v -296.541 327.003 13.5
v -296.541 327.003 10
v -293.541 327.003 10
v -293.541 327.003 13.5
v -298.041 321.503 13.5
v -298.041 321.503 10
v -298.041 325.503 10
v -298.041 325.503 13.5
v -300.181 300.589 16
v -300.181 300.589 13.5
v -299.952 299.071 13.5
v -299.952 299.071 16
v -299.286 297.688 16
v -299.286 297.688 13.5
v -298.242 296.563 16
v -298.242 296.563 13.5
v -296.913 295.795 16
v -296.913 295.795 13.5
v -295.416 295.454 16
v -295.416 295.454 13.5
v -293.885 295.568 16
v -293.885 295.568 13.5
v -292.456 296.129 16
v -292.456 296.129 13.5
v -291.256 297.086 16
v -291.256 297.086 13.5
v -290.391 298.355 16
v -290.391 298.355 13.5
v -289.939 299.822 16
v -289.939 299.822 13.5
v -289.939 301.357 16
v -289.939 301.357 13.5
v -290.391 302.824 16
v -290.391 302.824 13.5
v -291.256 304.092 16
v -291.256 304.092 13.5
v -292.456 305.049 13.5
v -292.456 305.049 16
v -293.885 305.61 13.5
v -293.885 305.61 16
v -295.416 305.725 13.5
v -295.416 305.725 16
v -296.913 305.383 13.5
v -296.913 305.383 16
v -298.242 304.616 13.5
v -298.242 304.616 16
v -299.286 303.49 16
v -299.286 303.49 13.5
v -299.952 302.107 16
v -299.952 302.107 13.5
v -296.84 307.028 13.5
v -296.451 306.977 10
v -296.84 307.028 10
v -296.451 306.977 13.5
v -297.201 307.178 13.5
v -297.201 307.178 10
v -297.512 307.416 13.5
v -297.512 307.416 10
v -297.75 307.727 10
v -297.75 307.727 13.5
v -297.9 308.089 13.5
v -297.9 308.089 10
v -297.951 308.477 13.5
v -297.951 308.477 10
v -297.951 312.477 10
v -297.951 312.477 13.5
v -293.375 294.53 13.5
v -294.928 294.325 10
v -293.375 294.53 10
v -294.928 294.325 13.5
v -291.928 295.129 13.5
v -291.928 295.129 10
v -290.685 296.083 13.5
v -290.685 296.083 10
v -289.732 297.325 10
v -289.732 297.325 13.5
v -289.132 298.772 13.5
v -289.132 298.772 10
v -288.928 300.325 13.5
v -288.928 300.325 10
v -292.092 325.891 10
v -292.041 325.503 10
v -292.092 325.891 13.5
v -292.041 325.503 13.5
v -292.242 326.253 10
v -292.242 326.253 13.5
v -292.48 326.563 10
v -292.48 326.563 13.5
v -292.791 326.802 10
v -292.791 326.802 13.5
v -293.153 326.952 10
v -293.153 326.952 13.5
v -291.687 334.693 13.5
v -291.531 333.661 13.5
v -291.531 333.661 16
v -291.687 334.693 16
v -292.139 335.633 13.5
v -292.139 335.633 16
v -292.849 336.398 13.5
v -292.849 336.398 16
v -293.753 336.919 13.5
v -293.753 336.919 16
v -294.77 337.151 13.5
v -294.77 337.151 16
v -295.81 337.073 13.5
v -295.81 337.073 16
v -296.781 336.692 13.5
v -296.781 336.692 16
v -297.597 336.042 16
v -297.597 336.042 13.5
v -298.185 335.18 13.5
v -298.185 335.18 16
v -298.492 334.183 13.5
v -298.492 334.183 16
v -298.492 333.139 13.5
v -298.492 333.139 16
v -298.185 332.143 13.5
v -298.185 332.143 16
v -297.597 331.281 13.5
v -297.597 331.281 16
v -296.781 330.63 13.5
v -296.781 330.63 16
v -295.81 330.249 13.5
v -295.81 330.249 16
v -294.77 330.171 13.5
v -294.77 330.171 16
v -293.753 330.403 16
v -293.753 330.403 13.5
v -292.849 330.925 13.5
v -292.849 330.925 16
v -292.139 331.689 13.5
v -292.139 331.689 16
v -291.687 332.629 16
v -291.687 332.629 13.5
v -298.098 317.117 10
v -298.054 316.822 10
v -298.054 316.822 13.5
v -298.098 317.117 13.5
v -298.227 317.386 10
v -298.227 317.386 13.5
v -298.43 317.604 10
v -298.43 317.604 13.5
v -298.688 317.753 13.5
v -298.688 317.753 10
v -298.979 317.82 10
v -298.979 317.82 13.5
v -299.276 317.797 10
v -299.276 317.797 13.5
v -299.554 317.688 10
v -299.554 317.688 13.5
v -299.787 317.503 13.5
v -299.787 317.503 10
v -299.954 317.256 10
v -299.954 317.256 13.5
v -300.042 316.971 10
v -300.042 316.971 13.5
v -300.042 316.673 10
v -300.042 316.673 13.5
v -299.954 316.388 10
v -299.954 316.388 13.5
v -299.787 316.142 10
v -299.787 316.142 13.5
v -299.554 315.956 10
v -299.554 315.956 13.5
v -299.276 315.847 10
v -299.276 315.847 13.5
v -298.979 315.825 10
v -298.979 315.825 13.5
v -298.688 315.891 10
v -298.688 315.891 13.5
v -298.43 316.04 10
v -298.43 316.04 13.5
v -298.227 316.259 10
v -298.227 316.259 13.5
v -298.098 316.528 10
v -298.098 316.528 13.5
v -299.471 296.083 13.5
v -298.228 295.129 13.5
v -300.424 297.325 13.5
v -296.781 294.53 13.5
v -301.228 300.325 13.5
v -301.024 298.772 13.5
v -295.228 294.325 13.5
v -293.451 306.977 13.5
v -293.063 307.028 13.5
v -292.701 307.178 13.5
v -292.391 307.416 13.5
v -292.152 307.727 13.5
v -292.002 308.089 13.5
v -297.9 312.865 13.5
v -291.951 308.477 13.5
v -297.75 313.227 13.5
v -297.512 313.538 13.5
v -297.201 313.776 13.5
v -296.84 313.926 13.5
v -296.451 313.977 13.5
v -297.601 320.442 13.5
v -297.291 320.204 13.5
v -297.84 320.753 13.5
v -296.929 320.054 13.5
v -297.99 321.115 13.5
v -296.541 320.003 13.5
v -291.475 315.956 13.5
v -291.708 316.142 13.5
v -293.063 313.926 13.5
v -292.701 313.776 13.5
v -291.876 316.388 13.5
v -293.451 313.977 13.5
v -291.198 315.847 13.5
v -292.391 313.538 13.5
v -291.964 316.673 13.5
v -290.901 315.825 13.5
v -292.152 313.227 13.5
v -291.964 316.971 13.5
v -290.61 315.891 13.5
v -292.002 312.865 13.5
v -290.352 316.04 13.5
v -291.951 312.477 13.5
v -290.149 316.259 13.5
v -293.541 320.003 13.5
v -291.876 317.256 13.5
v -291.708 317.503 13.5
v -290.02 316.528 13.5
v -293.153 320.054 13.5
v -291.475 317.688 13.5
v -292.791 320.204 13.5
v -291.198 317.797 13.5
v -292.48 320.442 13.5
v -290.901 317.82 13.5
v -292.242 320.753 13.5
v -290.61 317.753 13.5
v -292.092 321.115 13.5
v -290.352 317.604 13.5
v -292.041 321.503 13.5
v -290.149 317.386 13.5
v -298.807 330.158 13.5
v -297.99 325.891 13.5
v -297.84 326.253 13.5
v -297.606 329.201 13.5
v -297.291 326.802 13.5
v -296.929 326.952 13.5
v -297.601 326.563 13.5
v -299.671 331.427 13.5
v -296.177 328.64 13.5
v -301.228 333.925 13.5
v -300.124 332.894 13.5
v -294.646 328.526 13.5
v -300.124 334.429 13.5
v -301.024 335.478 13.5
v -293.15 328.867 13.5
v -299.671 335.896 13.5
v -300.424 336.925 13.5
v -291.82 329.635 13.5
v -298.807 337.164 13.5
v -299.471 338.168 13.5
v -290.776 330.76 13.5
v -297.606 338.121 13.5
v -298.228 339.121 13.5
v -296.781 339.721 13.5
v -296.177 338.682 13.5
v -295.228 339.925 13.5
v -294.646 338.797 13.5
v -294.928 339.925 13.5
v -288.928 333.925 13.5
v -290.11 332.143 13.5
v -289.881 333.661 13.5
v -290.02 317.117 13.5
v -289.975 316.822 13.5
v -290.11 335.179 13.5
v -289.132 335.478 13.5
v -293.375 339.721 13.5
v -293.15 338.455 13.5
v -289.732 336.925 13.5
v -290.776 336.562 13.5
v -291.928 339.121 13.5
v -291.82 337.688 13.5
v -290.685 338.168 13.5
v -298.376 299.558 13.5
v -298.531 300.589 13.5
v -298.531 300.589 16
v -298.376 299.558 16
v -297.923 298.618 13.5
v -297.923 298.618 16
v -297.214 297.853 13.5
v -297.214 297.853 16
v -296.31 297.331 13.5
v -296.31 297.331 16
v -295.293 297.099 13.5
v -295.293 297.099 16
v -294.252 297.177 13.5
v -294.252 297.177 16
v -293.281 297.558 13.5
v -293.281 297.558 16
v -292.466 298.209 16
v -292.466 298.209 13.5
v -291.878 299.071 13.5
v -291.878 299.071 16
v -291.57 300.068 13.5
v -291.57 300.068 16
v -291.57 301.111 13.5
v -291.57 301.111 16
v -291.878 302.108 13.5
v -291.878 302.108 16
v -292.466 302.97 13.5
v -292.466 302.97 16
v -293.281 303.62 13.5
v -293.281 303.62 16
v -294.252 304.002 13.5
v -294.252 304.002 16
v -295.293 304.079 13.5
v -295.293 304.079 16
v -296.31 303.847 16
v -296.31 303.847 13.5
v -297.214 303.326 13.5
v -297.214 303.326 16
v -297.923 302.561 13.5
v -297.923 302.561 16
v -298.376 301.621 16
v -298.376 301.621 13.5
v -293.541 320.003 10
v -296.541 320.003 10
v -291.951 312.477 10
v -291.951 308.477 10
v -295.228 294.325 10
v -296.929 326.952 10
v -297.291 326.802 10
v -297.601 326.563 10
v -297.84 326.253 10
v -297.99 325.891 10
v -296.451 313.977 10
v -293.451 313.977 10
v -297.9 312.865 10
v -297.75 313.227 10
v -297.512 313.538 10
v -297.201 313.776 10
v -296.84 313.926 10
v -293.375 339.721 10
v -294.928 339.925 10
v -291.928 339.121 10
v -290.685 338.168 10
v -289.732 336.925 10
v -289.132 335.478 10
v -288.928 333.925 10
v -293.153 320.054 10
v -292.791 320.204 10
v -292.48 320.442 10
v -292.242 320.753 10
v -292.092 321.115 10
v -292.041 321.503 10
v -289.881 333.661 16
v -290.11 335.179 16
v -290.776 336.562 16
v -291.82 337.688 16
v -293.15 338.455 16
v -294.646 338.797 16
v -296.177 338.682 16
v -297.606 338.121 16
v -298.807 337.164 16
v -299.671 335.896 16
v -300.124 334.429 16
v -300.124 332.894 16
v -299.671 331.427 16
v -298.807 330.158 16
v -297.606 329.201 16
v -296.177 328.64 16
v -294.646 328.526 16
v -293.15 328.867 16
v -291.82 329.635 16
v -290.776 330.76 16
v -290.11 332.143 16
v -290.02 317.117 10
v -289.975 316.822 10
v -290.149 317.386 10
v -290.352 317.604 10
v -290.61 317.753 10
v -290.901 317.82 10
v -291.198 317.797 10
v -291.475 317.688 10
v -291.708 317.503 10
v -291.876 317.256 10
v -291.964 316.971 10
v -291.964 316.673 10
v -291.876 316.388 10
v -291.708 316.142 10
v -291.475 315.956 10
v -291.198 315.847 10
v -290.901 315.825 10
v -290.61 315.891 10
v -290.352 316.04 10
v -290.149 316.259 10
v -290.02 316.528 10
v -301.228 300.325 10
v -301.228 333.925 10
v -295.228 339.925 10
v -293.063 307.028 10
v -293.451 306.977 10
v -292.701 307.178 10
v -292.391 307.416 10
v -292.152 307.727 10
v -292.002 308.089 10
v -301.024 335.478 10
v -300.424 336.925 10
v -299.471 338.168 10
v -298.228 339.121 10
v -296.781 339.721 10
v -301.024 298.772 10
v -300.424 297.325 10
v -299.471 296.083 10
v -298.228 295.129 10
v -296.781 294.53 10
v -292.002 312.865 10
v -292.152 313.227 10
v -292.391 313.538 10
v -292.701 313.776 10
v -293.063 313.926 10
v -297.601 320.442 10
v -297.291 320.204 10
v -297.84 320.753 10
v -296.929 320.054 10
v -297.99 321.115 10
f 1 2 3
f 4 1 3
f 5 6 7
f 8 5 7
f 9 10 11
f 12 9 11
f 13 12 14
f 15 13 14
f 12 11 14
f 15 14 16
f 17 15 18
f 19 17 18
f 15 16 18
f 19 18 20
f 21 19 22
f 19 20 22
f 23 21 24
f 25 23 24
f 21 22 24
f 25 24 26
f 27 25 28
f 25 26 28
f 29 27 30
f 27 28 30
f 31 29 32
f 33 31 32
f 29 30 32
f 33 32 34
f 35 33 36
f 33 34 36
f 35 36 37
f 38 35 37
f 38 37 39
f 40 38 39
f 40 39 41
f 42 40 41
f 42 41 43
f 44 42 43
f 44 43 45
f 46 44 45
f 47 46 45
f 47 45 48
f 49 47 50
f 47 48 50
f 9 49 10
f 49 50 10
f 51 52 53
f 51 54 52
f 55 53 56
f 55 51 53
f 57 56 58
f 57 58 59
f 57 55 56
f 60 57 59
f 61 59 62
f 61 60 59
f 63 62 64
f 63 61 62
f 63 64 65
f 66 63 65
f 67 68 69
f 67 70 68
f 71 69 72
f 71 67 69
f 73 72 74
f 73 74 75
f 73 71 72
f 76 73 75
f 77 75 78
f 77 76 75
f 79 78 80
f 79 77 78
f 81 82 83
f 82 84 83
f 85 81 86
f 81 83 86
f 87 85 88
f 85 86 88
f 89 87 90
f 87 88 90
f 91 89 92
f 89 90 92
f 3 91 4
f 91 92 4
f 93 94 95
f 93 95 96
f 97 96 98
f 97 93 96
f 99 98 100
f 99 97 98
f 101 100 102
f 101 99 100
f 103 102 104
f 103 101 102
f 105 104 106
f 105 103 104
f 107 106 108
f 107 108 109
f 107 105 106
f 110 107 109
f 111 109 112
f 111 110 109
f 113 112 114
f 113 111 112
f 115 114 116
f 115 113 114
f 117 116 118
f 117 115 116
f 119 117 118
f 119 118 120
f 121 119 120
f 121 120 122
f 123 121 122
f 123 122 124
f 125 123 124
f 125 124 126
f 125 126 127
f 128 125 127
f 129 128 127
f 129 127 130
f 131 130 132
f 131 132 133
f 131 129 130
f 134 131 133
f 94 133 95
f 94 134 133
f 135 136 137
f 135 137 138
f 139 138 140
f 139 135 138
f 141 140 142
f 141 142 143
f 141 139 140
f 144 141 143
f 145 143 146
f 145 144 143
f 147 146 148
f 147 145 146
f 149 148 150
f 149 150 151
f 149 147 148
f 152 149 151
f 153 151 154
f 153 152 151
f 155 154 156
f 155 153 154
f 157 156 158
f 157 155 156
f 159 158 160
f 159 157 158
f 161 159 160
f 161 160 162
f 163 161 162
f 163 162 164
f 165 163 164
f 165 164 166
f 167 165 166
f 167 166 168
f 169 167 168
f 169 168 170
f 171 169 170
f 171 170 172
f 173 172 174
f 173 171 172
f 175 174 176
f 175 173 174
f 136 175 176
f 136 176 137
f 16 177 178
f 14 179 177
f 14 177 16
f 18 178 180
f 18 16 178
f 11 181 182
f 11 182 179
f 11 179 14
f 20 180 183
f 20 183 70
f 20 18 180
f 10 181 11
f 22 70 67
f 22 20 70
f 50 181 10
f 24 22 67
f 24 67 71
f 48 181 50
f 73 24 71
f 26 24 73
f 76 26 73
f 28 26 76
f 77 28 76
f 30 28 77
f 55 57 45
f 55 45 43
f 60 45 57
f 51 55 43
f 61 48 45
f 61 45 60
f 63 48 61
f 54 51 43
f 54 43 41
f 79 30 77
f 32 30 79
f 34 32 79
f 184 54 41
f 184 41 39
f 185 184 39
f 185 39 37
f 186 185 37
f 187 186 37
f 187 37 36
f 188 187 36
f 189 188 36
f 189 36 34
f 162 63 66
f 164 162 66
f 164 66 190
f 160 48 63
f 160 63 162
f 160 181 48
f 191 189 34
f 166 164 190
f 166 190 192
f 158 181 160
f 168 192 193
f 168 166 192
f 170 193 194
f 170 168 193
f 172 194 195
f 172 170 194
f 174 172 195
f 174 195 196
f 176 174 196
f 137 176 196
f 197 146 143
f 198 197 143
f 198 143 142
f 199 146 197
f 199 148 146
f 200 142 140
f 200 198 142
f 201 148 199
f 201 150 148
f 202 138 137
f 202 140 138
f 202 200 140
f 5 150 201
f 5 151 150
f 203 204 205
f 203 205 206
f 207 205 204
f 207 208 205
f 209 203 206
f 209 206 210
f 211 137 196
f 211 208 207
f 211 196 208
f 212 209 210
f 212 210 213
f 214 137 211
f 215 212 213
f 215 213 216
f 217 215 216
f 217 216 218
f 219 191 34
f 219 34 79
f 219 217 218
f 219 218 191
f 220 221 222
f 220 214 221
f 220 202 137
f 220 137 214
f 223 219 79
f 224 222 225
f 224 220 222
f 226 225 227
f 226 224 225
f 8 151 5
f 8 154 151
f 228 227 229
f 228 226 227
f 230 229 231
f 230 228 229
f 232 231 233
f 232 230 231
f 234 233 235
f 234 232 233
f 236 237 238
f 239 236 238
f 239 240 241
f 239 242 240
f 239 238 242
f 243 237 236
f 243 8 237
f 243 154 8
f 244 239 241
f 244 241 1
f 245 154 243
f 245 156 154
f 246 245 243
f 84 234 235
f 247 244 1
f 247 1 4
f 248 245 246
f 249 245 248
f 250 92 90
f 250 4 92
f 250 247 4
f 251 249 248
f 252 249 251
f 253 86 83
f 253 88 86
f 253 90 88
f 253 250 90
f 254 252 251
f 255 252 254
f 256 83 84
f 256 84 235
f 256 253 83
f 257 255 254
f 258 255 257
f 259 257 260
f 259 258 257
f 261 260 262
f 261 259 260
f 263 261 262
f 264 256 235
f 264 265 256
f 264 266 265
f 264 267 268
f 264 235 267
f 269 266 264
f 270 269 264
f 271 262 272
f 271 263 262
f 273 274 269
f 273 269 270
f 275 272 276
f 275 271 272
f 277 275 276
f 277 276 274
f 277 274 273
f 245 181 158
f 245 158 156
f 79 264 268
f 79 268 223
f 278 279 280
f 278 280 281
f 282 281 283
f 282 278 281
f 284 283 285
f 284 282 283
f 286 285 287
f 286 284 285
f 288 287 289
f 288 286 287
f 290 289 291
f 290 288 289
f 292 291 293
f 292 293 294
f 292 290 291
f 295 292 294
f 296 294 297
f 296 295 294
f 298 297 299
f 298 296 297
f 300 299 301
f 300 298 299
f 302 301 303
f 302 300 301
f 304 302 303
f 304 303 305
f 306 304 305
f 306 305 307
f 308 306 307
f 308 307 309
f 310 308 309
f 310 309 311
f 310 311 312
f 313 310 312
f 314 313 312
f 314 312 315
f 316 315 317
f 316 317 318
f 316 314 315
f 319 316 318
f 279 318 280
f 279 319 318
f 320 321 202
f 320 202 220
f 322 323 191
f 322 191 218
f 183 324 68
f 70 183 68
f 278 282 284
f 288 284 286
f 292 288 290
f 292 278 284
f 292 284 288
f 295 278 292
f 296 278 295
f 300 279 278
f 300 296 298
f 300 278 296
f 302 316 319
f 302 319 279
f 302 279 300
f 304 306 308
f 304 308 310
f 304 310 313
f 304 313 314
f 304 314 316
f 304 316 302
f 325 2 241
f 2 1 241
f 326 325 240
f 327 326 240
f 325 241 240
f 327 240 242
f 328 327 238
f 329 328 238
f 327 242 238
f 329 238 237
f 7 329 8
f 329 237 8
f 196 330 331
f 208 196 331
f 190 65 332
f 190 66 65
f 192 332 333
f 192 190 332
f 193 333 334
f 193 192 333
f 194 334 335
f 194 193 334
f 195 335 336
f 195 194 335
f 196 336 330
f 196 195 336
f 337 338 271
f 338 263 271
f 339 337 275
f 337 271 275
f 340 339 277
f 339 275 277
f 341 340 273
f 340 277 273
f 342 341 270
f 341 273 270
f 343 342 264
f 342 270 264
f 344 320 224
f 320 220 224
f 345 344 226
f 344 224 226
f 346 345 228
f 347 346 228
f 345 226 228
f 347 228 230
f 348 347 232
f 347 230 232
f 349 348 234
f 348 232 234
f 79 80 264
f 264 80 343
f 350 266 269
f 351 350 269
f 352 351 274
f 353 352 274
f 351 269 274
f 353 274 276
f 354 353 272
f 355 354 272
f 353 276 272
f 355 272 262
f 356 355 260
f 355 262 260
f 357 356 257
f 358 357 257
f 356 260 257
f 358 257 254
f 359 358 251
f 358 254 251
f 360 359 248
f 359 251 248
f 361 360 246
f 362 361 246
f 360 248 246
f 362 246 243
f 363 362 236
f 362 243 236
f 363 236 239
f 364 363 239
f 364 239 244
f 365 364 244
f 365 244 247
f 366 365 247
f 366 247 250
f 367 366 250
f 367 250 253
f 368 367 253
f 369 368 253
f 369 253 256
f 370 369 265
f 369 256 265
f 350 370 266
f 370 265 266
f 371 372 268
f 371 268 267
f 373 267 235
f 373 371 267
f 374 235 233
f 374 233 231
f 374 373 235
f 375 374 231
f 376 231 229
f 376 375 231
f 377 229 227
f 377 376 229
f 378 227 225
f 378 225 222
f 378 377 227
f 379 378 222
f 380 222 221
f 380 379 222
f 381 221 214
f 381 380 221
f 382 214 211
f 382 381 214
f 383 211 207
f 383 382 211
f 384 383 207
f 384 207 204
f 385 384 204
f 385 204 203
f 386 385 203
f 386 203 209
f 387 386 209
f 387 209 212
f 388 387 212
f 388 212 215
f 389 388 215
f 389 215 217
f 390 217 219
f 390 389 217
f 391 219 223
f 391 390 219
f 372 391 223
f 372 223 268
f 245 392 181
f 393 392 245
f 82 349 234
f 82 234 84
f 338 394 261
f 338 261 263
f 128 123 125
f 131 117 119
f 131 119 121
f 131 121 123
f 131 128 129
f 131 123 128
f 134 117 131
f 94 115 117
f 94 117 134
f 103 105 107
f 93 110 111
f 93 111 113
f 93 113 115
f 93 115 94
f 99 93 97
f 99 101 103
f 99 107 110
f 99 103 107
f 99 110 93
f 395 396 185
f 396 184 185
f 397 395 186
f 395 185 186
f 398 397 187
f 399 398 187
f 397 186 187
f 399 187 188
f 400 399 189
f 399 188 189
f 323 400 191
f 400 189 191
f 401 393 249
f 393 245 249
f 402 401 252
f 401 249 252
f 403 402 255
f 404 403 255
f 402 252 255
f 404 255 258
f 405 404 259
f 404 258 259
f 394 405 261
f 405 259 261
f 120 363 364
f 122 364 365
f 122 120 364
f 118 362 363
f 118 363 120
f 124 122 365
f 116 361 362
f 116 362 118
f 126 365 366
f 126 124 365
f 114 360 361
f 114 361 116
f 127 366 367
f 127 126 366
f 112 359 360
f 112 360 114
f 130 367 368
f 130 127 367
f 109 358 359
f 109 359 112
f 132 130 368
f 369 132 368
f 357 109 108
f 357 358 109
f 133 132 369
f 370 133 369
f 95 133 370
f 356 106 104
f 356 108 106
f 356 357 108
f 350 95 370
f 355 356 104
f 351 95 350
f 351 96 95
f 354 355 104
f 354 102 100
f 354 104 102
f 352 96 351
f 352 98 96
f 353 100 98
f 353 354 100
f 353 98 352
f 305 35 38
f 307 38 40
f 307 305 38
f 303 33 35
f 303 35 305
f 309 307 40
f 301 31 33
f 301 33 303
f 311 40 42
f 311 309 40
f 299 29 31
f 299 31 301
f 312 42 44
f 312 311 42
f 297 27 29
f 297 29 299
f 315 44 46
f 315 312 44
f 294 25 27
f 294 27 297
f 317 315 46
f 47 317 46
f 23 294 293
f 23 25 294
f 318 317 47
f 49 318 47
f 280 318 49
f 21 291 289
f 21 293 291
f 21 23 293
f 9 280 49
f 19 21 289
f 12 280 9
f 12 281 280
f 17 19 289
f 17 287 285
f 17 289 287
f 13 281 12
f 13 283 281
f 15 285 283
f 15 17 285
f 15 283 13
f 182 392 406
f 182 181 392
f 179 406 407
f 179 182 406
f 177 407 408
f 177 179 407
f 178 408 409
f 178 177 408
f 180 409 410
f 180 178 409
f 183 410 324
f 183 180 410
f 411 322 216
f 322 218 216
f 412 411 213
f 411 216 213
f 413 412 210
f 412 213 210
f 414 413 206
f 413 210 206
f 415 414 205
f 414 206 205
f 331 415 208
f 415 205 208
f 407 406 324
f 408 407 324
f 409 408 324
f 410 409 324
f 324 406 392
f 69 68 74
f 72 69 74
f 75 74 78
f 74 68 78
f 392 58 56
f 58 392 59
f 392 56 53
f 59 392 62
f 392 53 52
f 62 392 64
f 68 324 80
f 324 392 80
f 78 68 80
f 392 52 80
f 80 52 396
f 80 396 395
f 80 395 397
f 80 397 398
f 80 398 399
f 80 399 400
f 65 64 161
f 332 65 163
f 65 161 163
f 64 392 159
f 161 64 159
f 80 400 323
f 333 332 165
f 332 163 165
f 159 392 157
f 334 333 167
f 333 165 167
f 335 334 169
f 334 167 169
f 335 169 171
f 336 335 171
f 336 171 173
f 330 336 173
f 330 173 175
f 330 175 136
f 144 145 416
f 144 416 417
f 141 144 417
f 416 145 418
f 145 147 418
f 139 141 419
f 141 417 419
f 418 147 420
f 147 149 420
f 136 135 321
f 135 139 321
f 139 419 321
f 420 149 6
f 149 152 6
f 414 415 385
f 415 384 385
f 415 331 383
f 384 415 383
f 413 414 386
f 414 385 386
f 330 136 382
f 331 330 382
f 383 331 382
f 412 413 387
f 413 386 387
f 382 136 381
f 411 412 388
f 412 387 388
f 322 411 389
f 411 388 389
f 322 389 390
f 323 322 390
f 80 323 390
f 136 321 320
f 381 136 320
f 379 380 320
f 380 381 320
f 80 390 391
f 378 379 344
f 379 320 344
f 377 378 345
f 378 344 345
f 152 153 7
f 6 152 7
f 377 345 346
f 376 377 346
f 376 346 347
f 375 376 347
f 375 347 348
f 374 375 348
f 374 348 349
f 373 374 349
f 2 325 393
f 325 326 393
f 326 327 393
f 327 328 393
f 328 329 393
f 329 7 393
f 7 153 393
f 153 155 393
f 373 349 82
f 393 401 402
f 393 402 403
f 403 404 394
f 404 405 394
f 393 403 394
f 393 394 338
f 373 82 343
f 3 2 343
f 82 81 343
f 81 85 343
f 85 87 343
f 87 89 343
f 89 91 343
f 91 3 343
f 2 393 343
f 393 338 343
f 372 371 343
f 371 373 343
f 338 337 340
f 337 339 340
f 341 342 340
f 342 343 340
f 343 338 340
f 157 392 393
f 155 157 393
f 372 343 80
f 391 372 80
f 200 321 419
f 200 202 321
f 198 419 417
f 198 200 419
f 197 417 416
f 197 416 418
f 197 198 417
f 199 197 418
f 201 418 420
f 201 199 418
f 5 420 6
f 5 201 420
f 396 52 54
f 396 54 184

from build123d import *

# Parameters (mm, degrees)
SKETCH1_W           = 12.3
SKETCH1_H           = 45.6
SKETCH1_R           = 1
SKETCH1_W_2         = 6
SKETCH1_H_2         = 7
BOSS_EXTRUDE1_DEPTH = 3.5
FILLET1_R           = 6
FILLET2_R           = 1.5
SKETCH2_R           = 5.15
SKETCH2_R_2         = 3.5
BOSS_EXTRUDE2_DEPTH = 2.5


with BuildPart() as part:
    # Sketch1 → Boss-Extrude1 (new body)
    with BuildSketch(Plane.XY.offset(10)):
        with Locations((-295.077990014, 317.125181865)):
            Rectangle(SKETCH1_W, SKETCH1_H)
        with Locations((-290.97531395, 316.822329318)):
            Circle(SKETCH1_R, mode=Mode.SUBTRACT)
        with Locations((-299.053504652, 316.822329318)):
            Circle(SKETCH1_R, mode=Mode.SUBTRACT)
        with Locations((-294.951374343, 310.476860406)):
            Rectangle(SKETCH1_W_2, SKETCH1_H_2, mode=Mode.SUBTRACT)
        with Locations((-295.040754442, 323.502825528)):
            Rectangle(SKETCH1_W_2, SKETCH1_H_2, mode=Mode.SUBTRACT)
    extrude(amount=BOSS_EXTRUDE1_DEPTH)

    # Fillet1
    fillet1_edges = [part.edges().sort_by_distance(p)[0] for p in [
        (-301.227990014, 339.925181865, 11.75),
        (-288.927990014, 339.925181865, 11.75),
        (-288.927990014, 294.325181865, 11.75),
        (-301.227990014, 294.325181865, 11.75),
    ]]
    fillet(fillet1_edges, radius=FILLET1_R)

    # Fillet2
    fillet2_edges = [part.edges().sort_by_distance(p)[0] for p in [
        (-291.951374343, 306.976860406, 11.75),
        (-291.951374343, 313.976860406, 11.75),
        (-297.951374343, 313.976860406, 11.75),
        (-297.951374343, 306.976860406, 11.75),
        (-292.040754442, 320.002825528, 11.75),
        (-292.040754442, 327.002825528, 11.75),
        (-298.040754442, 327.002825528, 11.75),
        (-298.040754442, 320.002825528, 11.75),
    ]]
    fillet(fillet2_edges, radius=FILLET2_R)

    # Sketch2 → Boss-Extrude2 (add)
    # profile 1 of 2: a face of its own
    with BuildSketch(Plane.XY.offset(13.5)):
        with Locations((-295.031286372, 333.66110815)):
            Circle(SKETCH2_R)
        with Locations((-295.031286372, 333.66110815)):
            Circle(SKETCH2_R_2, mode=Mode.SUBTRACT)
    # profile 2 of 2: a face of its own
    with BuildSketch(Plane.XY.offset(13.5)):
        with Locations(Location((-295.031286372, 300.589255581, 0), (0, 0, 180))):
            Circle(SKETCH2_R)
        with Locations(Location((-295.031286372, 300.589255581, 0), (0, 0, 180))):
            Circle(SKETCH2_R_2, mode=Mode.SUBTRACT)
    extrude(amount=BOSS_EXTRUDE2_DEPTH)


solid = part.part
